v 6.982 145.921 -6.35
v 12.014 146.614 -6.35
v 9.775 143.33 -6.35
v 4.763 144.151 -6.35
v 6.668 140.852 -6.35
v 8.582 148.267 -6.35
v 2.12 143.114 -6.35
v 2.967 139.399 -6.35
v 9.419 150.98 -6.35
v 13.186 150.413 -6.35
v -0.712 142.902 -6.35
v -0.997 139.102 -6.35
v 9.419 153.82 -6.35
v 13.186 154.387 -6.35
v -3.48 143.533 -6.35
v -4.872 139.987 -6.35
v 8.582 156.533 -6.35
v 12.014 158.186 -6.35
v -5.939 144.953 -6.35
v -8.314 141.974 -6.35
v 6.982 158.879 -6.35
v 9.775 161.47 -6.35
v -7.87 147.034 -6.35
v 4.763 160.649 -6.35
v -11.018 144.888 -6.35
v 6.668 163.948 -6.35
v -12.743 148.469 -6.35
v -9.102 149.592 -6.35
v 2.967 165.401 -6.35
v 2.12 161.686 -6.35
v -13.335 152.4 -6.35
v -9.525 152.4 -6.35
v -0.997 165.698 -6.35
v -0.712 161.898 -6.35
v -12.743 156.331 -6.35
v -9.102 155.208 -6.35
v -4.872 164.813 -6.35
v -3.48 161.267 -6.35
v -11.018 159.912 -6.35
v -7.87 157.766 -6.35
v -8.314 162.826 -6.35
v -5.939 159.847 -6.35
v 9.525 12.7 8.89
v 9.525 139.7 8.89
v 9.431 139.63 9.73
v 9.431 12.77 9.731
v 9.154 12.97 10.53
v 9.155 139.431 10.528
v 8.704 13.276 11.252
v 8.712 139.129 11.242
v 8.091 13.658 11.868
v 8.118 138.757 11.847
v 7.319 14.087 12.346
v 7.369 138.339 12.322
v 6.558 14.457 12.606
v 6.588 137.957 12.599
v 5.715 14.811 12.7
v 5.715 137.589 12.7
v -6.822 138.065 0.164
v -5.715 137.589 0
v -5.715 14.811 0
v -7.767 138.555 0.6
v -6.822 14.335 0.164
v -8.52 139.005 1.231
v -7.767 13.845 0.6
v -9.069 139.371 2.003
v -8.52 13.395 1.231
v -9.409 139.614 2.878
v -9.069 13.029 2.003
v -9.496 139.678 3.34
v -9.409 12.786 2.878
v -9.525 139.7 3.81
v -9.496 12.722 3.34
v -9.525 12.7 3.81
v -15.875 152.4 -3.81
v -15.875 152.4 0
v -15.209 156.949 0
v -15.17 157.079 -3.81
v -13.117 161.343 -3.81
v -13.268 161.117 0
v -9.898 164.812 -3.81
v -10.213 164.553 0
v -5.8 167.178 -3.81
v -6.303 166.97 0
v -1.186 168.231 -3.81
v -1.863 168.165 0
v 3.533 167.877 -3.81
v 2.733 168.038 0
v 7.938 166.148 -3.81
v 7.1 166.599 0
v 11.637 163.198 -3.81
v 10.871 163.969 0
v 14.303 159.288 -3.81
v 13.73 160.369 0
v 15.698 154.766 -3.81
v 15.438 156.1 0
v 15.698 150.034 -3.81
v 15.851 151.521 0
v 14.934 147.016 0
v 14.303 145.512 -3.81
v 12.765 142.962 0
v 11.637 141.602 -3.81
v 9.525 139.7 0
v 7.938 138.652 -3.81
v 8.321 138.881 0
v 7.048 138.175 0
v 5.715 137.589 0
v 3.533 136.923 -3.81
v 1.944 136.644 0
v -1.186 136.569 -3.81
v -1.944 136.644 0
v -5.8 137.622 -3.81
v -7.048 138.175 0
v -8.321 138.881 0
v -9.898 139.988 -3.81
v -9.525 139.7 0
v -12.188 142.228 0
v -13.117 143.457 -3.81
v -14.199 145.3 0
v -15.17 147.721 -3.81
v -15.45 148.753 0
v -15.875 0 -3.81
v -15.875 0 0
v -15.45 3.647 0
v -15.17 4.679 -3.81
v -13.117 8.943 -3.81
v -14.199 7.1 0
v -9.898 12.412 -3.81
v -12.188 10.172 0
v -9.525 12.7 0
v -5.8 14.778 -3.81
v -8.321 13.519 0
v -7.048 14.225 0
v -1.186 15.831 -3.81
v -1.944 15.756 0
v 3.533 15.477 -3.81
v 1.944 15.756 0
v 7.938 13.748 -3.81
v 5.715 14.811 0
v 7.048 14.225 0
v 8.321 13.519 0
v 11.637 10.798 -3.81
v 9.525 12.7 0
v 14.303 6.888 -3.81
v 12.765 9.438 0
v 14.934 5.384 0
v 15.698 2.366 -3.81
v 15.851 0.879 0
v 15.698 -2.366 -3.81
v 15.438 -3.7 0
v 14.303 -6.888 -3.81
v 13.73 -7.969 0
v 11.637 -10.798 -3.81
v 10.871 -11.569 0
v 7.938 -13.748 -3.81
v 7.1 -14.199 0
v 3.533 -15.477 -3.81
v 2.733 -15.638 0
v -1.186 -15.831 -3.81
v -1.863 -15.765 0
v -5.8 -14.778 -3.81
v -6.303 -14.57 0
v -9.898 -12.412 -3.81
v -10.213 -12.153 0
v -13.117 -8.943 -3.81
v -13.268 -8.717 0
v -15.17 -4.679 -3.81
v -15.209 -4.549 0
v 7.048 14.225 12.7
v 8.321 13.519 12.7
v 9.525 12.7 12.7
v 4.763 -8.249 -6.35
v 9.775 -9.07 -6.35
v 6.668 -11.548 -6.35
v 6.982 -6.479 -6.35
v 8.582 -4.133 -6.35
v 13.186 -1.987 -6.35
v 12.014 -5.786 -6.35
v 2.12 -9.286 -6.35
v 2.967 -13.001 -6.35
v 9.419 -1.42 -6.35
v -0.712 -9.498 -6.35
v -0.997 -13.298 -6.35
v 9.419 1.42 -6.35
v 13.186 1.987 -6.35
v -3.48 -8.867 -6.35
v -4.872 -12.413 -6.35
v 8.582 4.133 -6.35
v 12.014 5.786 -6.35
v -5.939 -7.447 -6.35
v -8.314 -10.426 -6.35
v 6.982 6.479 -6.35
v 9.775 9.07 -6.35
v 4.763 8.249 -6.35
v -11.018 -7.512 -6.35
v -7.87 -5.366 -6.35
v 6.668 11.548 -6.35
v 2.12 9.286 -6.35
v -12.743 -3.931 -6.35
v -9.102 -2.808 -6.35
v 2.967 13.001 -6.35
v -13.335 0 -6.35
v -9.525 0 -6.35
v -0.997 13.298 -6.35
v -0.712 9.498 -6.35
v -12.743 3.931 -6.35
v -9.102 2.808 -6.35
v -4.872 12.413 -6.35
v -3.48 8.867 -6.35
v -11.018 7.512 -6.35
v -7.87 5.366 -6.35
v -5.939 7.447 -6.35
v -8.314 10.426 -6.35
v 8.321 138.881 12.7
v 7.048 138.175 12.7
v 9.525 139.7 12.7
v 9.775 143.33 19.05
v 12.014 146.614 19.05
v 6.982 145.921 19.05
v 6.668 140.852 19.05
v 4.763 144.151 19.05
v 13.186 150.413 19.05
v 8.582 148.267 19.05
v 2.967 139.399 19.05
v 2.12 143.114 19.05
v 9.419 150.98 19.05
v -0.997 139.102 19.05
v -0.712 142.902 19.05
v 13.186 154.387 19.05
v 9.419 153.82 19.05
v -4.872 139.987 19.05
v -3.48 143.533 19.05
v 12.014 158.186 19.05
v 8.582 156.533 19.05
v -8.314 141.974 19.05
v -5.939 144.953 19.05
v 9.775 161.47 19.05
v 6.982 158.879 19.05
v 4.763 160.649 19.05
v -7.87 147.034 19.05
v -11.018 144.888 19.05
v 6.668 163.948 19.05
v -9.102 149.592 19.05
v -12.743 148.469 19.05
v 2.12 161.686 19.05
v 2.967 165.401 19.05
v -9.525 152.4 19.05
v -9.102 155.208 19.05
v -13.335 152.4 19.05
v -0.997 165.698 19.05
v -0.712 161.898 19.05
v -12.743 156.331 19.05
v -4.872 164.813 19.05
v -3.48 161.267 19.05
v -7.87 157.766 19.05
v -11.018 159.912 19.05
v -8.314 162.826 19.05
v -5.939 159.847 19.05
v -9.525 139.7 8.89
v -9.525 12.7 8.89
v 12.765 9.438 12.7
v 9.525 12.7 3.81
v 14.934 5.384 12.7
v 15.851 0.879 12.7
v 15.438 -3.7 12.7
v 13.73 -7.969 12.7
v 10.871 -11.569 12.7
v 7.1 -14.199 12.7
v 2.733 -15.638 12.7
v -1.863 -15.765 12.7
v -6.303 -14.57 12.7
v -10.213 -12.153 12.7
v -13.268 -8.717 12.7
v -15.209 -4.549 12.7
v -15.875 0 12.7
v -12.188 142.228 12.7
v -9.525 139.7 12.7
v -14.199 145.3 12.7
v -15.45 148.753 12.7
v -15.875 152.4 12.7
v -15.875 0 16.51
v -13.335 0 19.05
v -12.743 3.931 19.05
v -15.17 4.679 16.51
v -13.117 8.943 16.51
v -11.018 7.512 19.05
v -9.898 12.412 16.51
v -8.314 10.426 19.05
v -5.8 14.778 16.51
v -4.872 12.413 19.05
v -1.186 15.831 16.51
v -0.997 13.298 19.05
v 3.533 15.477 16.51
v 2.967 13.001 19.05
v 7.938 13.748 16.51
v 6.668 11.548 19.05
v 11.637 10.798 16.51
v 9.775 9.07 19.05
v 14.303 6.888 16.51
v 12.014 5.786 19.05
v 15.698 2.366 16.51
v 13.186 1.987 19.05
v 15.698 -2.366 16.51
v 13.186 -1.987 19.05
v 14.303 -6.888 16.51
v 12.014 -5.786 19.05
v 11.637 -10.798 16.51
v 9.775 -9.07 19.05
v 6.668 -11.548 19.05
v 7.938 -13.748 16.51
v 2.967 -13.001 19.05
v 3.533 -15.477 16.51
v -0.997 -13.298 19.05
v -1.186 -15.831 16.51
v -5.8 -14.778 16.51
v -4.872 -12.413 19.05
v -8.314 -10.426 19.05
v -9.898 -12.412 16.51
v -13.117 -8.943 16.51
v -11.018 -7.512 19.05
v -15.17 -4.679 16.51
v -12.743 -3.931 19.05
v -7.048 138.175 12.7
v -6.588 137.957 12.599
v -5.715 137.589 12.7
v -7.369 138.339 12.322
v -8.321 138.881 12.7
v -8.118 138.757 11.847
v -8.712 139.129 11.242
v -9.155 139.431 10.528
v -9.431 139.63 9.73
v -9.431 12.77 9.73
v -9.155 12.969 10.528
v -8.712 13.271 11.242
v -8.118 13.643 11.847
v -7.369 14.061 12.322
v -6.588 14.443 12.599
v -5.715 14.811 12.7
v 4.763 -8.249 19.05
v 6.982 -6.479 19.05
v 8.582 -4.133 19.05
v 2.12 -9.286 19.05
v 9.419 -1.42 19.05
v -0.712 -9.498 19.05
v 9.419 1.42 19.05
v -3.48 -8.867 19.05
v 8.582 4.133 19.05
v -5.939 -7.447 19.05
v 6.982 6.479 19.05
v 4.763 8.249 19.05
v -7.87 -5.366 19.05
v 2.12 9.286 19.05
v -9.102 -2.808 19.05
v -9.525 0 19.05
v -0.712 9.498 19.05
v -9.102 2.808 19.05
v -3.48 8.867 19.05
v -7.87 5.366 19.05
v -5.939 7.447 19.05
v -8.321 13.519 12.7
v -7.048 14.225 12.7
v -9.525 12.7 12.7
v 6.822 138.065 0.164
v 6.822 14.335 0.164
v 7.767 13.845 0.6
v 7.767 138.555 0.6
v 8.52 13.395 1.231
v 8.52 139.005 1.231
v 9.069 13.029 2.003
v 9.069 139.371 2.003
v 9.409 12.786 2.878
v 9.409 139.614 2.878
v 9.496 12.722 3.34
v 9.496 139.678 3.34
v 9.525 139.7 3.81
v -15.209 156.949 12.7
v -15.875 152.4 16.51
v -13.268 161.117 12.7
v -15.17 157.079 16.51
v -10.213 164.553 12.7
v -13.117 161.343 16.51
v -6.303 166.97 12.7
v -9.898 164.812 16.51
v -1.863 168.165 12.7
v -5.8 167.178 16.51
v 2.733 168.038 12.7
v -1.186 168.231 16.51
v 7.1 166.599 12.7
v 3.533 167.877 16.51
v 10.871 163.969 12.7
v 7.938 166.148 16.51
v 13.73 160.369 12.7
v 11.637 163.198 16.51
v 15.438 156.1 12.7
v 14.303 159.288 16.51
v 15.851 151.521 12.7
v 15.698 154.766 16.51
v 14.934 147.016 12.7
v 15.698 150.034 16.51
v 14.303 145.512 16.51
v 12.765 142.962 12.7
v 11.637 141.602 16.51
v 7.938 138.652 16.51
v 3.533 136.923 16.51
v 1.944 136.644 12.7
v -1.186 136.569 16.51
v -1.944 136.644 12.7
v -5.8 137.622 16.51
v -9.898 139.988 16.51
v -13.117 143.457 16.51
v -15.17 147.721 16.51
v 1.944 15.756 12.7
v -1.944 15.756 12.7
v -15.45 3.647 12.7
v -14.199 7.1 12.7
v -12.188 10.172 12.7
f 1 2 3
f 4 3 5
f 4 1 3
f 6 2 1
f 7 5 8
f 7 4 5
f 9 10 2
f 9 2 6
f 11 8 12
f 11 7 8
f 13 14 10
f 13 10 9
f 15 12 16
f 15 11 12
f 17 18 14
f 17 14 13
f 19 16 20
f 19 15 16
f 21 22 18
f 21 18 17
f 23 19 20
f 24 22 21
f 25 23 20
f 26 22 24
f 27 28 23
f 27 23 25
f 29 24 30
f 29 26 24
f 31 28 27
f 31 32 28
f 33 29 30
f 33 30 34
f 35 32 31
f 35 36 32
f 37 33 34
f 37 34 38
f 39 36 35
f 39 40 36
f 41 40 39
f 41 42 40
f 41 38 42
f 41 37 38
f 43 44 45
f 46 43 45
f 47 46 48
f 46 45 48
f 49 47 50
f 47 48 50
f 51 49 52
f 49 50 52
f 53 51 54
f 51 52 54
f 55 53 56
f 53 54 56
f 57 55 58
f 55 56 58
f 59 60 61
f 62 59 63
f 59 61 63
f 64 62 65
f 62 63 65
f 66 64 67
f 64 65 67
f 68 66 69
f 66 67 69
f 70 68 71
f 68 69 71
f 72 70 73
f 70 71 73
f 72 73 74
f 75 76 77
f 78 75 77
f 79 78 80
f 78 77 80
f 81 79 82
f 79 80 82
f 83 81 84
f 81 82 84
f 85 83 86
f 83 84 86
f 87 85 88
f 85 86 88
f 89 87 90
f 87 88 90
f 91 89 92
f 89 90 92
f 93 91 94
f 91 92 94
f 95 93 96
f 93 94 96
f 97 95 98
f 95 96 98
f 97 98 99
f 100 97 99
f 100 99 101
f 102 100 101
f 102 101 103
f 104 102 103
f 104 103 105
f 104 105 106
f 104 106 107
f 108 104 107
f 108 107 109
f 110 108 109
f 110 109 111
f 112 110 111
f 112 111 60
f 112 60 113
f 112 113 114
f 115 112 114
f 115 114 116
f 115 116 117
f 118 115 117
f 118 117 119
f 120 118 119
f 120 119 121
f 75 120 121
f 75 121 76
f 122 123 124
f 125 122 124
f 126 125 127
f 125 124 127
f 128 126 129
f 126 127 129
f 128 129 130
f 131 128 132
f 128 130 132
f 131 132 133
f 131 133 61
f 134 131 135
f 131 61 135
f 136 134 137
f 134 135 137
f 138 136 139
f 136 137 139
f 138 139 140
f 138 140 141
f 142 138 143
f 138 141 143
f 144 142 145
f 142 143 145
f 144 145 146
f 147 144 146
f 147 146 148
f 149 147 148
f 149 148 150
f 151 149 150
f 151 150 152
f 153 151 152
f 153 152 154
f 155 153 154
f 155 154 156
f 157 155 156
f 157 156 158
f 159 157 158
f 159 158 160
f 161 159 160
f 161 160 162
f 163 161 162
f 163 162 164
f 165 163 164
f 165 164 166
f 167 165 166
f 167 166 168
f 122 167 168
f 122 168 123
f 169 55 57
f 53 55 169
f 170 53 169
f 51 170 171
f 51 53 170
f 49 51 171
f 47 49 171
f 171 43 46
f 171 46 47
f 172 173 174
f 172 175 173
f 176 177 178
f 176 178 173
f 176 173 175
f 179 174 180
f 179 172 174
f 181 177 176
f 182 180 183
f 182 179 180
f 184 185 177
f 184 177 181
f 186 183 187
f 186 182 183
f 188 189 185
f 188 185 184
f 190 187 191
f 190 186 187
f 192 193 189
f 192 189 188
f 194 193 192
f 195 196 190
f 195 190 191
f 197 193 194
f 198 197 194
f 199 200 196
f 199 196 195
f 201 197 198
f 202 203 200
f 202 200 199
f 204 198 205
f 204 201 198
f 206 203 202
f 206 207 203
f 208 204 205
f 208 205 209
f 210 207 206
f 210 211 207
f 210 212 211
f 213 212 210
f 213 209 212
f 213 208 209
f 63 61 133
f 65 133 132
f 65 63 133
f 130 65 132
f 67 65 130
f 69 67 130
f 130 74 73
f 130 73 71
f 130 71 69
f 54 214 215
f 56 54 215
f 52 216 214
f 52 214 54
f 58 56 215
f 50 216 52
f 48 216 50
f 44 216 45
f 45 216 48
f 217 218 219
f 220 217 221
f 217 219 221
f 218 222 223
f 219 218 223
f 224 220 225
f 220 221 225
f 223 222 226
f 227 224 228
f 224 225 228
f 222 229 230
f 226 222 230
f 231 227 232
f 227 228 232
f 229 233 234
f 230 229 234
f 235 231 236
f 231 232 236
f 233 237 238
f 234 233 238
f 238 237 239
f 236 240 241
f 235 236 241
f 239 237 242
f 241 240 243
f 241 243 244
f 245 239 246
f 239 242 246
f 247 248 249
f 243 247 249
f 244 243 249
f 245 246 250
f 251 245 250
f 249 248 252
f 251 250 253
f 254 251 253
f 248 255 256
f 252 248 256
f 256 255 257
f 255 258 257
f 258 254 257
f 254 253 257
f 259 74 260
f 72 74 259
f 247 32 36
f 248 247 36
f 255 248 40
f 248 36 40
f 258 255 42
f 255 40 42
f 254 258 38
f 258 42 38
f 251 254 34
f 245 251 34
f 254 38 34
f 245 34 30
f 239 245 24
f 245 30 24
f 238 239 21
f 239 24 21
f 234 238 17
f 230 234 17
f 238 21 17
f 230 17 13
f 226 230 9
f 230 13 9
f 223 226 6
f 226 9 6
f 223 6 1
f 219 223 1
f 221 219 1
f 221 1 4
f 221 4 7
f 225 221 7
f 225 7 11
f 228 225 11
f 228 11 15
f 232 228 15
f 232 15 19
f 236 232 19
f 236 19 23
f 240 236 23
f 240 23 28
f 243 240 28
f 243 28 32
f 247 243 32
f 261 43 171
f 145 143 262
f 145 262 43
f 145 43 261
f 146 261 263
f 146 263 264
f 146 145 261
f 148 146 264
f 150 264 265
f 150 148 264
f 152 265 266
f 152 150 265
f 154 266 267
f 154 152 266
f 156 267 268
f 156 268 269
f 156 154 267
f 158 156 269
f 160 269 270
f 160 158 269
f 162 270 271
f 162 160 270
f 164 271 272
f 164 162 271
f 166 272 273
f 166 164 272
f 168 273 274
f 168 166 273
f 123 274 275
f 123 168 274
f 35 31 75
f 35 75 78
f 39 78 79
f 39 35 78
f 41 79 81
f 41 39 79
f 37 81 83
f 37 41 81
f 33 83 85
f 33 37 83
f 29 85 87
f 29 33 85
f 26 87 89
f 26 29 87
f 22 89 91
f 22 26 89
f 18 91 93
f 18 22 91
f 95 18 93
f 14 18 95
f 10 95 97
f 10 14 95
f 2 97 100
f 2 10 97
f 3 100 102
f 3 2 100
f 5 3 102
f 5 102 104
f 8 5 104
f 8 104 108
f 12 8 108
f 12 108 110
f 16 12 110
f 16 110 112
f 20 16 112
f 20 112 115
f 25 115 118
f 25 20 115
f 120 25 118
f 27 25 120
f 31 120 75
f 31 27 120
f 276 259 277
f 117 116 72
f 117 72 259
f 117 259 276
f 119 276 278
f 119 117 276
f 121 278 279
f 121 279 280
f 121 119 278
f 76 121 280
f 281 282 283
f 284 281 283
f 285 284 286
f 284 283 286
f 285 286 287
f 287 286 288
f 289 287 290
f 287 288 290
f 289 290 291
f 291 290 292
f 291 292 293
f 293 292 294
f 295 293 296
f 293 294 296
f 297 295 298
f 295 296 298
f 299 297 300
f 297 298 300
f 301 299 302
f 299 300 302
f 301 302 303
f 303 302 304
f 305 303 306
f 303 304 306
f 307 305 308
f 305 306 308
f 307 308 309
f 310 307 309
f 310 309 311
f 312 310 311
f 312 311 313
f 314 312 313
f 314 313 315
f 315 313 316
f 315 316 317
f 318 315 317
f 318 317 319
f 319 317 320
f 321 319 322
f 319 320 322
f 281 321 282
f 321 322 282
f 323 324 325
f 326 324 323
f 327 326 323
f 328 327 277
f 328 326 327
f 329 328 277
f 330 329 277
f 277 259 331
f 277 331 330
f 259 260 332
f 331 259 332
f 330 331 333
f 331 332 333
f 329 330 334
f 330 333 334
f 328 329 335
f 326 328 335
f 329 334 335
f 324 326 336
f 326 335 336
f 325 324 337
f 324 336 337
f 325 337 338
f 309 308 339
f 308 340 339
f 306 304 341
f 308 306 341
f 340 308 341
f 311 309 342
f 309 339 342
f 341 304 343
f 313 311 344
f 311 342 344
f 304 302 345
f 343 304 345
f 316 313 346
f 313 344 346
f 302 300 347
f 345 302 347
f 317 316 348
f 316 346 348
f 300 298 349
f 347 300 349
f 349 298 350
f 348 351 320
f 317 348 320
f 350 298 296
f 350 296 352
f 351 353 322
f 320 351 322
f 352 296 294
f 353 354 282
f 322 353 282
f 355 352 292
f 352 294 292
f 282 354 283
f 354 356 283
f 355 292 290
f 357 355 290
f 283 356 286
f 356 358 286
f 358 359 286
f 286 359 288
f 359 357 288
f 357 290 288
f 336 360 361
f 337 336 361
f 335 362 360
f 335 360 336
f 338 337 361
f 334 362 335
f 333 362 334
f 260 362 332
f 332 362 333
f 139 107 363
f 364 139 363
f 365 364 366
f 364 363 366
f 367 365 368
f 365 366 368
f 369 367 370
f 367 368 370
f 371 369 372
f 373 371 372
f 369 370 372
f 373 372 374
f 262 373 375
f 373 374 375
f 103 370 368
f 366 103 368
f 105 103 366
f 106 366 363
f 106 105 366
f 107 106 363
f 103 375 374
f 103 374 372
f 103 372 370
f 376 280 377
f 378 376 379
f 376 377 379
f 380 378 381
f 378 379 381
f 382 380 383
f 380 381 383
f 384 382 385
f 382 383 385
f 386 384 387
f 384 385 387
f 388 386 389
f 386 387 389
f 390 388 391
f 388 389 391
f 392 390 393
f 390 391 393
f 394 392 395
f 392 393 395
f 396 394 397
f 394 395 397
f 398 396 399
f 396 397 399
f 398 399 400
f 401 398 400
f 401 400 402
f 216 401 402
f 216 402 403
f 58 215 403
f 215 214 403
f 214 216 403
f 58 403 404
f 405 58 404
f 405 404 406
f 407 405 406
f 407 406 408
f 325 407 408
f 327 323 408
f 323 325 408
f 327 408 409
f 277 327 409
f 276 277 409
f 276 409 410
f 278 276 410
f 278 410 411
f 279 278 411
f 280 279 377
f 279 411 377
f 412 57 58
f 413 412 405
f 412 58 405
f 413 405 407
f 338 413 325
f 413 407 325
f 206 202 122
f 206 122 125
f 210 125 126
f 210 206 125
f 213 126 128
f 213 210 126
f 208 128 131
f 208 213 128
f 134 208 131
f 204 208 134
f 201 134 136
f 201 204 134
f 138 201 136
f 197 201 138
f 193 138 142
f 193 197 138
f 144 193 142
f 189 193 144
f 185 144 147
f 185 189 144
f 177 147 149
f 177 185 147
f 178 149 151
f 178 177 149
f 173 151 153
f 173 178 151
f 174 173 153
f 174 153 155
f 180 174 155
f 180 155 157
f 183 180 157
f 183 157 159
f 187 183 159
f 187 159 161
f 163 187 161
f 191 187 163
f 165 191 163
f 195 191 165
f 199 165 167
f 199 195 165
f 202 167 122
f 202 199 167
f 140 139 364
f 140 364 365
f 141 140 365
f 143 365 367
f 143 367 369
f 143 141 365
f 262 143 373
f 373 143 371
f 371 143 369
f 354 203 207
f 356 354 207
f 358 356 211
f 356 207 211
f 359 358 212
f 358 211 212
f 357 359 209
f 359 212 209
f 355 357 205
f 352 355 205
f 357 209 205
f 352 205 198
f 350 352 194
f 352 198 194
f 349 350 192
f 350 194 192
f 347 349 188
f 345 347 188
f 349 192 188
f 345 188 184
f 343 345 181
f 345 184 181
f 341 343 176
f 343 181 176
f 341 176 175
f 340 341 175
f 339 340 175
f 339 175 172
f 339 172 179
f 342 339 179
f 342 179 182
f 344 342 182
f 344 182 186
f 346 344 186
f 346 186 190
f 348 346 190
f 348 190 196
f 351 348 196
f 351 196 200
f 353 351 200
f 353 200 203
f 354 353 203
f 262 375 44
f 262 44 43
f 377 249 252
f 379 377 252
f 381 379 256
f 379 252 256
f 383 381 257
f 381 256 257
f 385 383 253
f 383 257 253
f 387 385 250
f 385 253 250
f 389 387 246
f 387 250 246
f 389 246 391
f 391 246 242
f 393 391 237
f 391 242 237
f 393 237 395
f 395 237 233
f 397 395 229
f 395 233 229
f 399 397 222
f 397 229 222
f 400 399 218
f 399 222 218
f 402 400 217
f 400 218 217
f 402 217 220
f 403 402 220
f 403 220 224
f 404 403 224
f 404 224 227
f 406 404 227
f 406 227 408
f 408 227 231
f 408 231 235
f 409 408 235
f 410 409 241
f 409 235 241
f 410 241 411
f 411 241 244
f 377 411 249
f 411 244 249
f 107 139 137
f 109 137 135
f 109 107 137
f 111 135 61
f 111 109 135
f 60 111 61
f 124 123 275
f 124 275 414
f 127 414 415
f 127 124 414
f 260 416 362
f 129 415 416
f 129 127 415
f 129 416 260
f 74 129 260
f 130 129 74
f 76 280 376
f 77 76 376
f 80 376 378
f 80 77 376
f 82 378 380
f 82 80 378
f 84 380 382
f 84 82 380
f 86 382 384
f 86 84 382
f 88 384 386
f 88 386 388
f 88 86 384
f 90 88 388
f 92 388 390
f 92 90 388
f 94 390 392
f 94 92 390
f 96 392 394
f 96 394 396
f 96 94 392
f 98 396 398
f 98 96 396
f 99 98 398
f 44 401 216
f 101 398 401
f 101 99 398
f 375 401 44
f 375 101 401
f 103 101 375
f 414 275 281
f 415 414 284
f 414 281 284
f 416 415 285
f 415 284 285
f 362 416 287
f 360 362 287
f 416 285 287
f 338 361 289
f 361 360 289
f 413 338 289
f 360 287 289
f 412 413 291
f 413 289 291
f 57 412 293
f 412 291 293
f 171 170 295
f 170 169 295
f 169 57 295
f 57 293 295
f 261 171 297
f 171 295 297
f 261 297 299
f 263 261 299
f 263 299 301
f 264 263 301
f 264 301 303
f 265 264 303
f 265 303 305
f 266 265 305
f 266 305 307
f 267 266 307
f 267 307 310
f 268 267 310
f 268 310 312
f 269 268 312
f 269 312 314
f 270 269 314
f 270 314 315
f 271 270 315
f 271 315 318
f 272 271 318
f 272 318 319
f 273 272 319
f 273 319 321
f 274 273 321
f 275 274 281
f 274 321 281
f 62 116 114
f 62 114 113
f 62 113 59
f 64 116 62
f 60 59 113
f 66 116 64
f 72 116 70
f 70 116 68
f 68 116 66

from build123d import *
from build123d.topology import SkipClean

# Parameters (mm, degrees)
BOSS_EXTRUDE1_DEPTH      = 12.7
BOSS_EXTRUDE2_DEPTH      = 6.35
BOSS_EXTRUDE2_DEPTH_BACK = 19.05
SKETCH3_R                = 15.875
FILLET1_R                = 3.81
SKETCH4_R                = 9.525
CUT_EXTRUDE1_DEPTH       = 52.578
CHAMFER1_SIZE            = 2.54


with BuildPart() as part:
    # Sketch2 → Boss-Extrude1 (new body)
    with BuildSketch(Plane.XY):
        with BuildLine():
            Line((-9.525, 12.7), (-9.525, 139.7))
            ThreePointArc((-9.525, 139.7), (0, 168.275), (9.525, 139.7))
            Line((9.525, 139.7), (9.525, 12.7))
            ThreePointArc((9.525, 12.7), (0, -15.875), (-9.525, 12.7))
        make_face()
    extrude(amount=BOSS_EXTRUDE1_DEPTH)

    # Sketch3 → Boss-Extrude2 (add, two sides: drawn at the far end of the back side and taken through both)
    with SkipClean():  # the faces are left unmerged after this step: merging them gives an invalid solid
        with BuildSketch(Plane(origin=(0, 0, 0), x_dir=(-1, 0, 0), z_dir=(0, 0, -1)).offset(-BOSS_EXTRUDE2_DEPTH_BACK)):
            with Locations((0, 152.4)):
                Circle(SKETCH3_R)
            Circle(SKETCH3_R)
        extrude(amount=BOSS_EXTRUDE2_DEPTH + BOSS_EXTRUDE2_DEPTH_BACK)
    add(part.part.scale(1), mode=Mode.REPLACE)  # the faces are merged on a copy

    # Fillet1
    # the kernel refuses this fillet: 3.81 mm, written as the material it takes off along each edge
    with BuildSketch(Plane(origin=(-9.525, 3.175, 12.7), x_dir=(1, 0, 0), z_dir=(0, 1, 0))) as fillet1_piece_1_section:
        with BuildLine():
            CenterArc((FILLET1_R, FILLET1_R), FILLET1_R, 180, 90)
            Line((0, FILLET1_R), (0, 0))
            Line((0, 0), (FILLET1_R, 0))
        make_face()
    fillet1_piece_1 = extrude(amount=146.05, mode=Mode.PRIVATE)
    fillet1_piece_1 = fillet1_piece_1 - Plane(origin=(0, 152.4, 11.833457617), x_dir=(-1, 0, 0), z_dir=(0, 0, -1)) * Cylinder(15.875, 308, mode=Mode.PRIVATE)
    fillet1_piece_1 = fillet1_piece_1 - Plane(origin=(0, 0, 11.833457617), x_dir=(-1, 0, 0), z_dir=(0, 0, -1)) * Cylinder(15.875, 308, mode=Mode.PRIVATE)
    add(fillet1_piece_1, mode=Mode.SUBTRACT)
    with BuildSketch(Plane(origin=(-9.525, 3.175, 0), x_dir=(1, 0, 0), z_dir=(0, 1, 0))) as fillet1_piece_2_section:
        with BuildLine():
            CenterArc((FILLET1_R, -FILLET1_R), FILLET1_R, 90, 90)
            Line((0, -FILLET1_R), (0, 0))
            Line((0, 0), (FILLET1_R, 0))
        make_face()
    fillet1_piece_2 = extrude(amount=146.05, mode=Mode.PRIVATE)
    fillet1_piece_2 = fillet1_piece_2 - Plane(origin=(0, 152.4, 0.866542383), x_dir=(-1, 0, 0), z_dir=(0, 0, 1)) * Cylinder(15.875, 308, mode=Mode.PRIVATE)
    fillet1_piece_2 = fillet1_piece_2 - Plane(origin=(0, 0, 0.866542383), x_dir=(-1, 0, 0), z_dir=(0, 0, 1)) * Cylinder(15.875, 308, mode=Mode.PRIVATE)
    add(fillet1_piece_2, mode=Mode.SUBTRACT)
    with BuildSketch(Plane(origin=(9.525, 149.225, 0), x_dir=(0, 0, 1), z_dir=(0, -1, 0))) as fillet1_piece_3_section:
        with BuildLine():
            CenterArc((FILLET1_R, FILLET1_R), FILLET1_R, 180, 90)
            Line((0, FILLET1_R), (0, 0))
            Line((0, 0), (FILLET1_R, 0))
        make_face()
    fillet1_piece_3 = extrude(amount=146.05, mode=Mode.PRIVATE)
    fillet1_piece_3 = fillet1_piece_3 - Plane(origin=(0, 152.4, 0.866542379), x_dir=(-0.5999999999999995, -0.8000000000000005, 0), z_dir=(0, 0, -1)) * Cylinder(15.875, 308, mode=Mode.PRIVATE)
    fillet1_piece_3 = fillet1_piece_3 - Plane(origin=(0, 0, 0.866542379), x_dir=(0.6000000000000001, 0.7999999999999999, 0), z_dir=(0, 0, -1)) * Cylinder(15.875, 308, mode=Mode.PRIVATE)
    add(fillet1_piece_3, mode=Mode.SUBTRACT)
    with BuildSketch(Plane(origin=(9.525, 149.225, 12.7), x_dir=(0, 0, -1), z_dir=(0, -1, 0))) as fillet1_piece_4_section:
        with BuildLine():
            CenterArc((FILLET1_R, -FILLET1_R), FILLET1_R, 90, 90)
            Line((0, -FILLET1_R), (0, 0))
            Line((0, 0), (FILLET1_R, 0))
        make_face()
    fillet1_piece_4 = extrude(amount=146.05, mode=Mode.PRIVATE)
    fillet1_piece_4 = fillet1_piece_4 - Plane(origin=(0, 152.4, 11.833457621), x_dir=(-0.5999999999999995, -0.8000000000000005, 0), z_dir=(0, 0, -1)) * Cylinder(15.875, 308, mode=Mode.PRIVATE)
    fillet1_piece_4 = fillet1_piece_4 - Plane(origin=(0, 0, 11.833457621), x_dir=(0.6000000000000001, 0.7999999999999999, 0), z_dir=(0, 0, -1)) * Cylinder(15.875, 308, mode=Mode.PRIVATE)
    add(fillet1_piece_4, mode=Mode.SUBTRACT)

    # Sketch4 → Cut-Extrude1 (cut)
    with BuildSketch(Plane(origin=(0, 0, -6.35), x_dir=(-1, 0, 0), z_dir=(0, 0, -1))):
        with Locations((0, 152.4)):
            Circle(SKETCH4_R)
        Circle(SKETCH4_R)
    extrude(amount=-CUT_EXTRUDE1_DEPTH, mode=Mode.SUBTRACT)

    # Chamfer1
    chamfer1_edges = [part.edges().sort_by_distance(p)[0] for p in [
        (15.875, 152.4, 19.05),
        (15.875, 152.4, -6.35),
        (15.875, 0, 19.05),
        (15.875, 0, -6.35),
    ]]
    chamfer(chamfer1_edges, length=CHAMFER1_SIZE)


solid = part.part
